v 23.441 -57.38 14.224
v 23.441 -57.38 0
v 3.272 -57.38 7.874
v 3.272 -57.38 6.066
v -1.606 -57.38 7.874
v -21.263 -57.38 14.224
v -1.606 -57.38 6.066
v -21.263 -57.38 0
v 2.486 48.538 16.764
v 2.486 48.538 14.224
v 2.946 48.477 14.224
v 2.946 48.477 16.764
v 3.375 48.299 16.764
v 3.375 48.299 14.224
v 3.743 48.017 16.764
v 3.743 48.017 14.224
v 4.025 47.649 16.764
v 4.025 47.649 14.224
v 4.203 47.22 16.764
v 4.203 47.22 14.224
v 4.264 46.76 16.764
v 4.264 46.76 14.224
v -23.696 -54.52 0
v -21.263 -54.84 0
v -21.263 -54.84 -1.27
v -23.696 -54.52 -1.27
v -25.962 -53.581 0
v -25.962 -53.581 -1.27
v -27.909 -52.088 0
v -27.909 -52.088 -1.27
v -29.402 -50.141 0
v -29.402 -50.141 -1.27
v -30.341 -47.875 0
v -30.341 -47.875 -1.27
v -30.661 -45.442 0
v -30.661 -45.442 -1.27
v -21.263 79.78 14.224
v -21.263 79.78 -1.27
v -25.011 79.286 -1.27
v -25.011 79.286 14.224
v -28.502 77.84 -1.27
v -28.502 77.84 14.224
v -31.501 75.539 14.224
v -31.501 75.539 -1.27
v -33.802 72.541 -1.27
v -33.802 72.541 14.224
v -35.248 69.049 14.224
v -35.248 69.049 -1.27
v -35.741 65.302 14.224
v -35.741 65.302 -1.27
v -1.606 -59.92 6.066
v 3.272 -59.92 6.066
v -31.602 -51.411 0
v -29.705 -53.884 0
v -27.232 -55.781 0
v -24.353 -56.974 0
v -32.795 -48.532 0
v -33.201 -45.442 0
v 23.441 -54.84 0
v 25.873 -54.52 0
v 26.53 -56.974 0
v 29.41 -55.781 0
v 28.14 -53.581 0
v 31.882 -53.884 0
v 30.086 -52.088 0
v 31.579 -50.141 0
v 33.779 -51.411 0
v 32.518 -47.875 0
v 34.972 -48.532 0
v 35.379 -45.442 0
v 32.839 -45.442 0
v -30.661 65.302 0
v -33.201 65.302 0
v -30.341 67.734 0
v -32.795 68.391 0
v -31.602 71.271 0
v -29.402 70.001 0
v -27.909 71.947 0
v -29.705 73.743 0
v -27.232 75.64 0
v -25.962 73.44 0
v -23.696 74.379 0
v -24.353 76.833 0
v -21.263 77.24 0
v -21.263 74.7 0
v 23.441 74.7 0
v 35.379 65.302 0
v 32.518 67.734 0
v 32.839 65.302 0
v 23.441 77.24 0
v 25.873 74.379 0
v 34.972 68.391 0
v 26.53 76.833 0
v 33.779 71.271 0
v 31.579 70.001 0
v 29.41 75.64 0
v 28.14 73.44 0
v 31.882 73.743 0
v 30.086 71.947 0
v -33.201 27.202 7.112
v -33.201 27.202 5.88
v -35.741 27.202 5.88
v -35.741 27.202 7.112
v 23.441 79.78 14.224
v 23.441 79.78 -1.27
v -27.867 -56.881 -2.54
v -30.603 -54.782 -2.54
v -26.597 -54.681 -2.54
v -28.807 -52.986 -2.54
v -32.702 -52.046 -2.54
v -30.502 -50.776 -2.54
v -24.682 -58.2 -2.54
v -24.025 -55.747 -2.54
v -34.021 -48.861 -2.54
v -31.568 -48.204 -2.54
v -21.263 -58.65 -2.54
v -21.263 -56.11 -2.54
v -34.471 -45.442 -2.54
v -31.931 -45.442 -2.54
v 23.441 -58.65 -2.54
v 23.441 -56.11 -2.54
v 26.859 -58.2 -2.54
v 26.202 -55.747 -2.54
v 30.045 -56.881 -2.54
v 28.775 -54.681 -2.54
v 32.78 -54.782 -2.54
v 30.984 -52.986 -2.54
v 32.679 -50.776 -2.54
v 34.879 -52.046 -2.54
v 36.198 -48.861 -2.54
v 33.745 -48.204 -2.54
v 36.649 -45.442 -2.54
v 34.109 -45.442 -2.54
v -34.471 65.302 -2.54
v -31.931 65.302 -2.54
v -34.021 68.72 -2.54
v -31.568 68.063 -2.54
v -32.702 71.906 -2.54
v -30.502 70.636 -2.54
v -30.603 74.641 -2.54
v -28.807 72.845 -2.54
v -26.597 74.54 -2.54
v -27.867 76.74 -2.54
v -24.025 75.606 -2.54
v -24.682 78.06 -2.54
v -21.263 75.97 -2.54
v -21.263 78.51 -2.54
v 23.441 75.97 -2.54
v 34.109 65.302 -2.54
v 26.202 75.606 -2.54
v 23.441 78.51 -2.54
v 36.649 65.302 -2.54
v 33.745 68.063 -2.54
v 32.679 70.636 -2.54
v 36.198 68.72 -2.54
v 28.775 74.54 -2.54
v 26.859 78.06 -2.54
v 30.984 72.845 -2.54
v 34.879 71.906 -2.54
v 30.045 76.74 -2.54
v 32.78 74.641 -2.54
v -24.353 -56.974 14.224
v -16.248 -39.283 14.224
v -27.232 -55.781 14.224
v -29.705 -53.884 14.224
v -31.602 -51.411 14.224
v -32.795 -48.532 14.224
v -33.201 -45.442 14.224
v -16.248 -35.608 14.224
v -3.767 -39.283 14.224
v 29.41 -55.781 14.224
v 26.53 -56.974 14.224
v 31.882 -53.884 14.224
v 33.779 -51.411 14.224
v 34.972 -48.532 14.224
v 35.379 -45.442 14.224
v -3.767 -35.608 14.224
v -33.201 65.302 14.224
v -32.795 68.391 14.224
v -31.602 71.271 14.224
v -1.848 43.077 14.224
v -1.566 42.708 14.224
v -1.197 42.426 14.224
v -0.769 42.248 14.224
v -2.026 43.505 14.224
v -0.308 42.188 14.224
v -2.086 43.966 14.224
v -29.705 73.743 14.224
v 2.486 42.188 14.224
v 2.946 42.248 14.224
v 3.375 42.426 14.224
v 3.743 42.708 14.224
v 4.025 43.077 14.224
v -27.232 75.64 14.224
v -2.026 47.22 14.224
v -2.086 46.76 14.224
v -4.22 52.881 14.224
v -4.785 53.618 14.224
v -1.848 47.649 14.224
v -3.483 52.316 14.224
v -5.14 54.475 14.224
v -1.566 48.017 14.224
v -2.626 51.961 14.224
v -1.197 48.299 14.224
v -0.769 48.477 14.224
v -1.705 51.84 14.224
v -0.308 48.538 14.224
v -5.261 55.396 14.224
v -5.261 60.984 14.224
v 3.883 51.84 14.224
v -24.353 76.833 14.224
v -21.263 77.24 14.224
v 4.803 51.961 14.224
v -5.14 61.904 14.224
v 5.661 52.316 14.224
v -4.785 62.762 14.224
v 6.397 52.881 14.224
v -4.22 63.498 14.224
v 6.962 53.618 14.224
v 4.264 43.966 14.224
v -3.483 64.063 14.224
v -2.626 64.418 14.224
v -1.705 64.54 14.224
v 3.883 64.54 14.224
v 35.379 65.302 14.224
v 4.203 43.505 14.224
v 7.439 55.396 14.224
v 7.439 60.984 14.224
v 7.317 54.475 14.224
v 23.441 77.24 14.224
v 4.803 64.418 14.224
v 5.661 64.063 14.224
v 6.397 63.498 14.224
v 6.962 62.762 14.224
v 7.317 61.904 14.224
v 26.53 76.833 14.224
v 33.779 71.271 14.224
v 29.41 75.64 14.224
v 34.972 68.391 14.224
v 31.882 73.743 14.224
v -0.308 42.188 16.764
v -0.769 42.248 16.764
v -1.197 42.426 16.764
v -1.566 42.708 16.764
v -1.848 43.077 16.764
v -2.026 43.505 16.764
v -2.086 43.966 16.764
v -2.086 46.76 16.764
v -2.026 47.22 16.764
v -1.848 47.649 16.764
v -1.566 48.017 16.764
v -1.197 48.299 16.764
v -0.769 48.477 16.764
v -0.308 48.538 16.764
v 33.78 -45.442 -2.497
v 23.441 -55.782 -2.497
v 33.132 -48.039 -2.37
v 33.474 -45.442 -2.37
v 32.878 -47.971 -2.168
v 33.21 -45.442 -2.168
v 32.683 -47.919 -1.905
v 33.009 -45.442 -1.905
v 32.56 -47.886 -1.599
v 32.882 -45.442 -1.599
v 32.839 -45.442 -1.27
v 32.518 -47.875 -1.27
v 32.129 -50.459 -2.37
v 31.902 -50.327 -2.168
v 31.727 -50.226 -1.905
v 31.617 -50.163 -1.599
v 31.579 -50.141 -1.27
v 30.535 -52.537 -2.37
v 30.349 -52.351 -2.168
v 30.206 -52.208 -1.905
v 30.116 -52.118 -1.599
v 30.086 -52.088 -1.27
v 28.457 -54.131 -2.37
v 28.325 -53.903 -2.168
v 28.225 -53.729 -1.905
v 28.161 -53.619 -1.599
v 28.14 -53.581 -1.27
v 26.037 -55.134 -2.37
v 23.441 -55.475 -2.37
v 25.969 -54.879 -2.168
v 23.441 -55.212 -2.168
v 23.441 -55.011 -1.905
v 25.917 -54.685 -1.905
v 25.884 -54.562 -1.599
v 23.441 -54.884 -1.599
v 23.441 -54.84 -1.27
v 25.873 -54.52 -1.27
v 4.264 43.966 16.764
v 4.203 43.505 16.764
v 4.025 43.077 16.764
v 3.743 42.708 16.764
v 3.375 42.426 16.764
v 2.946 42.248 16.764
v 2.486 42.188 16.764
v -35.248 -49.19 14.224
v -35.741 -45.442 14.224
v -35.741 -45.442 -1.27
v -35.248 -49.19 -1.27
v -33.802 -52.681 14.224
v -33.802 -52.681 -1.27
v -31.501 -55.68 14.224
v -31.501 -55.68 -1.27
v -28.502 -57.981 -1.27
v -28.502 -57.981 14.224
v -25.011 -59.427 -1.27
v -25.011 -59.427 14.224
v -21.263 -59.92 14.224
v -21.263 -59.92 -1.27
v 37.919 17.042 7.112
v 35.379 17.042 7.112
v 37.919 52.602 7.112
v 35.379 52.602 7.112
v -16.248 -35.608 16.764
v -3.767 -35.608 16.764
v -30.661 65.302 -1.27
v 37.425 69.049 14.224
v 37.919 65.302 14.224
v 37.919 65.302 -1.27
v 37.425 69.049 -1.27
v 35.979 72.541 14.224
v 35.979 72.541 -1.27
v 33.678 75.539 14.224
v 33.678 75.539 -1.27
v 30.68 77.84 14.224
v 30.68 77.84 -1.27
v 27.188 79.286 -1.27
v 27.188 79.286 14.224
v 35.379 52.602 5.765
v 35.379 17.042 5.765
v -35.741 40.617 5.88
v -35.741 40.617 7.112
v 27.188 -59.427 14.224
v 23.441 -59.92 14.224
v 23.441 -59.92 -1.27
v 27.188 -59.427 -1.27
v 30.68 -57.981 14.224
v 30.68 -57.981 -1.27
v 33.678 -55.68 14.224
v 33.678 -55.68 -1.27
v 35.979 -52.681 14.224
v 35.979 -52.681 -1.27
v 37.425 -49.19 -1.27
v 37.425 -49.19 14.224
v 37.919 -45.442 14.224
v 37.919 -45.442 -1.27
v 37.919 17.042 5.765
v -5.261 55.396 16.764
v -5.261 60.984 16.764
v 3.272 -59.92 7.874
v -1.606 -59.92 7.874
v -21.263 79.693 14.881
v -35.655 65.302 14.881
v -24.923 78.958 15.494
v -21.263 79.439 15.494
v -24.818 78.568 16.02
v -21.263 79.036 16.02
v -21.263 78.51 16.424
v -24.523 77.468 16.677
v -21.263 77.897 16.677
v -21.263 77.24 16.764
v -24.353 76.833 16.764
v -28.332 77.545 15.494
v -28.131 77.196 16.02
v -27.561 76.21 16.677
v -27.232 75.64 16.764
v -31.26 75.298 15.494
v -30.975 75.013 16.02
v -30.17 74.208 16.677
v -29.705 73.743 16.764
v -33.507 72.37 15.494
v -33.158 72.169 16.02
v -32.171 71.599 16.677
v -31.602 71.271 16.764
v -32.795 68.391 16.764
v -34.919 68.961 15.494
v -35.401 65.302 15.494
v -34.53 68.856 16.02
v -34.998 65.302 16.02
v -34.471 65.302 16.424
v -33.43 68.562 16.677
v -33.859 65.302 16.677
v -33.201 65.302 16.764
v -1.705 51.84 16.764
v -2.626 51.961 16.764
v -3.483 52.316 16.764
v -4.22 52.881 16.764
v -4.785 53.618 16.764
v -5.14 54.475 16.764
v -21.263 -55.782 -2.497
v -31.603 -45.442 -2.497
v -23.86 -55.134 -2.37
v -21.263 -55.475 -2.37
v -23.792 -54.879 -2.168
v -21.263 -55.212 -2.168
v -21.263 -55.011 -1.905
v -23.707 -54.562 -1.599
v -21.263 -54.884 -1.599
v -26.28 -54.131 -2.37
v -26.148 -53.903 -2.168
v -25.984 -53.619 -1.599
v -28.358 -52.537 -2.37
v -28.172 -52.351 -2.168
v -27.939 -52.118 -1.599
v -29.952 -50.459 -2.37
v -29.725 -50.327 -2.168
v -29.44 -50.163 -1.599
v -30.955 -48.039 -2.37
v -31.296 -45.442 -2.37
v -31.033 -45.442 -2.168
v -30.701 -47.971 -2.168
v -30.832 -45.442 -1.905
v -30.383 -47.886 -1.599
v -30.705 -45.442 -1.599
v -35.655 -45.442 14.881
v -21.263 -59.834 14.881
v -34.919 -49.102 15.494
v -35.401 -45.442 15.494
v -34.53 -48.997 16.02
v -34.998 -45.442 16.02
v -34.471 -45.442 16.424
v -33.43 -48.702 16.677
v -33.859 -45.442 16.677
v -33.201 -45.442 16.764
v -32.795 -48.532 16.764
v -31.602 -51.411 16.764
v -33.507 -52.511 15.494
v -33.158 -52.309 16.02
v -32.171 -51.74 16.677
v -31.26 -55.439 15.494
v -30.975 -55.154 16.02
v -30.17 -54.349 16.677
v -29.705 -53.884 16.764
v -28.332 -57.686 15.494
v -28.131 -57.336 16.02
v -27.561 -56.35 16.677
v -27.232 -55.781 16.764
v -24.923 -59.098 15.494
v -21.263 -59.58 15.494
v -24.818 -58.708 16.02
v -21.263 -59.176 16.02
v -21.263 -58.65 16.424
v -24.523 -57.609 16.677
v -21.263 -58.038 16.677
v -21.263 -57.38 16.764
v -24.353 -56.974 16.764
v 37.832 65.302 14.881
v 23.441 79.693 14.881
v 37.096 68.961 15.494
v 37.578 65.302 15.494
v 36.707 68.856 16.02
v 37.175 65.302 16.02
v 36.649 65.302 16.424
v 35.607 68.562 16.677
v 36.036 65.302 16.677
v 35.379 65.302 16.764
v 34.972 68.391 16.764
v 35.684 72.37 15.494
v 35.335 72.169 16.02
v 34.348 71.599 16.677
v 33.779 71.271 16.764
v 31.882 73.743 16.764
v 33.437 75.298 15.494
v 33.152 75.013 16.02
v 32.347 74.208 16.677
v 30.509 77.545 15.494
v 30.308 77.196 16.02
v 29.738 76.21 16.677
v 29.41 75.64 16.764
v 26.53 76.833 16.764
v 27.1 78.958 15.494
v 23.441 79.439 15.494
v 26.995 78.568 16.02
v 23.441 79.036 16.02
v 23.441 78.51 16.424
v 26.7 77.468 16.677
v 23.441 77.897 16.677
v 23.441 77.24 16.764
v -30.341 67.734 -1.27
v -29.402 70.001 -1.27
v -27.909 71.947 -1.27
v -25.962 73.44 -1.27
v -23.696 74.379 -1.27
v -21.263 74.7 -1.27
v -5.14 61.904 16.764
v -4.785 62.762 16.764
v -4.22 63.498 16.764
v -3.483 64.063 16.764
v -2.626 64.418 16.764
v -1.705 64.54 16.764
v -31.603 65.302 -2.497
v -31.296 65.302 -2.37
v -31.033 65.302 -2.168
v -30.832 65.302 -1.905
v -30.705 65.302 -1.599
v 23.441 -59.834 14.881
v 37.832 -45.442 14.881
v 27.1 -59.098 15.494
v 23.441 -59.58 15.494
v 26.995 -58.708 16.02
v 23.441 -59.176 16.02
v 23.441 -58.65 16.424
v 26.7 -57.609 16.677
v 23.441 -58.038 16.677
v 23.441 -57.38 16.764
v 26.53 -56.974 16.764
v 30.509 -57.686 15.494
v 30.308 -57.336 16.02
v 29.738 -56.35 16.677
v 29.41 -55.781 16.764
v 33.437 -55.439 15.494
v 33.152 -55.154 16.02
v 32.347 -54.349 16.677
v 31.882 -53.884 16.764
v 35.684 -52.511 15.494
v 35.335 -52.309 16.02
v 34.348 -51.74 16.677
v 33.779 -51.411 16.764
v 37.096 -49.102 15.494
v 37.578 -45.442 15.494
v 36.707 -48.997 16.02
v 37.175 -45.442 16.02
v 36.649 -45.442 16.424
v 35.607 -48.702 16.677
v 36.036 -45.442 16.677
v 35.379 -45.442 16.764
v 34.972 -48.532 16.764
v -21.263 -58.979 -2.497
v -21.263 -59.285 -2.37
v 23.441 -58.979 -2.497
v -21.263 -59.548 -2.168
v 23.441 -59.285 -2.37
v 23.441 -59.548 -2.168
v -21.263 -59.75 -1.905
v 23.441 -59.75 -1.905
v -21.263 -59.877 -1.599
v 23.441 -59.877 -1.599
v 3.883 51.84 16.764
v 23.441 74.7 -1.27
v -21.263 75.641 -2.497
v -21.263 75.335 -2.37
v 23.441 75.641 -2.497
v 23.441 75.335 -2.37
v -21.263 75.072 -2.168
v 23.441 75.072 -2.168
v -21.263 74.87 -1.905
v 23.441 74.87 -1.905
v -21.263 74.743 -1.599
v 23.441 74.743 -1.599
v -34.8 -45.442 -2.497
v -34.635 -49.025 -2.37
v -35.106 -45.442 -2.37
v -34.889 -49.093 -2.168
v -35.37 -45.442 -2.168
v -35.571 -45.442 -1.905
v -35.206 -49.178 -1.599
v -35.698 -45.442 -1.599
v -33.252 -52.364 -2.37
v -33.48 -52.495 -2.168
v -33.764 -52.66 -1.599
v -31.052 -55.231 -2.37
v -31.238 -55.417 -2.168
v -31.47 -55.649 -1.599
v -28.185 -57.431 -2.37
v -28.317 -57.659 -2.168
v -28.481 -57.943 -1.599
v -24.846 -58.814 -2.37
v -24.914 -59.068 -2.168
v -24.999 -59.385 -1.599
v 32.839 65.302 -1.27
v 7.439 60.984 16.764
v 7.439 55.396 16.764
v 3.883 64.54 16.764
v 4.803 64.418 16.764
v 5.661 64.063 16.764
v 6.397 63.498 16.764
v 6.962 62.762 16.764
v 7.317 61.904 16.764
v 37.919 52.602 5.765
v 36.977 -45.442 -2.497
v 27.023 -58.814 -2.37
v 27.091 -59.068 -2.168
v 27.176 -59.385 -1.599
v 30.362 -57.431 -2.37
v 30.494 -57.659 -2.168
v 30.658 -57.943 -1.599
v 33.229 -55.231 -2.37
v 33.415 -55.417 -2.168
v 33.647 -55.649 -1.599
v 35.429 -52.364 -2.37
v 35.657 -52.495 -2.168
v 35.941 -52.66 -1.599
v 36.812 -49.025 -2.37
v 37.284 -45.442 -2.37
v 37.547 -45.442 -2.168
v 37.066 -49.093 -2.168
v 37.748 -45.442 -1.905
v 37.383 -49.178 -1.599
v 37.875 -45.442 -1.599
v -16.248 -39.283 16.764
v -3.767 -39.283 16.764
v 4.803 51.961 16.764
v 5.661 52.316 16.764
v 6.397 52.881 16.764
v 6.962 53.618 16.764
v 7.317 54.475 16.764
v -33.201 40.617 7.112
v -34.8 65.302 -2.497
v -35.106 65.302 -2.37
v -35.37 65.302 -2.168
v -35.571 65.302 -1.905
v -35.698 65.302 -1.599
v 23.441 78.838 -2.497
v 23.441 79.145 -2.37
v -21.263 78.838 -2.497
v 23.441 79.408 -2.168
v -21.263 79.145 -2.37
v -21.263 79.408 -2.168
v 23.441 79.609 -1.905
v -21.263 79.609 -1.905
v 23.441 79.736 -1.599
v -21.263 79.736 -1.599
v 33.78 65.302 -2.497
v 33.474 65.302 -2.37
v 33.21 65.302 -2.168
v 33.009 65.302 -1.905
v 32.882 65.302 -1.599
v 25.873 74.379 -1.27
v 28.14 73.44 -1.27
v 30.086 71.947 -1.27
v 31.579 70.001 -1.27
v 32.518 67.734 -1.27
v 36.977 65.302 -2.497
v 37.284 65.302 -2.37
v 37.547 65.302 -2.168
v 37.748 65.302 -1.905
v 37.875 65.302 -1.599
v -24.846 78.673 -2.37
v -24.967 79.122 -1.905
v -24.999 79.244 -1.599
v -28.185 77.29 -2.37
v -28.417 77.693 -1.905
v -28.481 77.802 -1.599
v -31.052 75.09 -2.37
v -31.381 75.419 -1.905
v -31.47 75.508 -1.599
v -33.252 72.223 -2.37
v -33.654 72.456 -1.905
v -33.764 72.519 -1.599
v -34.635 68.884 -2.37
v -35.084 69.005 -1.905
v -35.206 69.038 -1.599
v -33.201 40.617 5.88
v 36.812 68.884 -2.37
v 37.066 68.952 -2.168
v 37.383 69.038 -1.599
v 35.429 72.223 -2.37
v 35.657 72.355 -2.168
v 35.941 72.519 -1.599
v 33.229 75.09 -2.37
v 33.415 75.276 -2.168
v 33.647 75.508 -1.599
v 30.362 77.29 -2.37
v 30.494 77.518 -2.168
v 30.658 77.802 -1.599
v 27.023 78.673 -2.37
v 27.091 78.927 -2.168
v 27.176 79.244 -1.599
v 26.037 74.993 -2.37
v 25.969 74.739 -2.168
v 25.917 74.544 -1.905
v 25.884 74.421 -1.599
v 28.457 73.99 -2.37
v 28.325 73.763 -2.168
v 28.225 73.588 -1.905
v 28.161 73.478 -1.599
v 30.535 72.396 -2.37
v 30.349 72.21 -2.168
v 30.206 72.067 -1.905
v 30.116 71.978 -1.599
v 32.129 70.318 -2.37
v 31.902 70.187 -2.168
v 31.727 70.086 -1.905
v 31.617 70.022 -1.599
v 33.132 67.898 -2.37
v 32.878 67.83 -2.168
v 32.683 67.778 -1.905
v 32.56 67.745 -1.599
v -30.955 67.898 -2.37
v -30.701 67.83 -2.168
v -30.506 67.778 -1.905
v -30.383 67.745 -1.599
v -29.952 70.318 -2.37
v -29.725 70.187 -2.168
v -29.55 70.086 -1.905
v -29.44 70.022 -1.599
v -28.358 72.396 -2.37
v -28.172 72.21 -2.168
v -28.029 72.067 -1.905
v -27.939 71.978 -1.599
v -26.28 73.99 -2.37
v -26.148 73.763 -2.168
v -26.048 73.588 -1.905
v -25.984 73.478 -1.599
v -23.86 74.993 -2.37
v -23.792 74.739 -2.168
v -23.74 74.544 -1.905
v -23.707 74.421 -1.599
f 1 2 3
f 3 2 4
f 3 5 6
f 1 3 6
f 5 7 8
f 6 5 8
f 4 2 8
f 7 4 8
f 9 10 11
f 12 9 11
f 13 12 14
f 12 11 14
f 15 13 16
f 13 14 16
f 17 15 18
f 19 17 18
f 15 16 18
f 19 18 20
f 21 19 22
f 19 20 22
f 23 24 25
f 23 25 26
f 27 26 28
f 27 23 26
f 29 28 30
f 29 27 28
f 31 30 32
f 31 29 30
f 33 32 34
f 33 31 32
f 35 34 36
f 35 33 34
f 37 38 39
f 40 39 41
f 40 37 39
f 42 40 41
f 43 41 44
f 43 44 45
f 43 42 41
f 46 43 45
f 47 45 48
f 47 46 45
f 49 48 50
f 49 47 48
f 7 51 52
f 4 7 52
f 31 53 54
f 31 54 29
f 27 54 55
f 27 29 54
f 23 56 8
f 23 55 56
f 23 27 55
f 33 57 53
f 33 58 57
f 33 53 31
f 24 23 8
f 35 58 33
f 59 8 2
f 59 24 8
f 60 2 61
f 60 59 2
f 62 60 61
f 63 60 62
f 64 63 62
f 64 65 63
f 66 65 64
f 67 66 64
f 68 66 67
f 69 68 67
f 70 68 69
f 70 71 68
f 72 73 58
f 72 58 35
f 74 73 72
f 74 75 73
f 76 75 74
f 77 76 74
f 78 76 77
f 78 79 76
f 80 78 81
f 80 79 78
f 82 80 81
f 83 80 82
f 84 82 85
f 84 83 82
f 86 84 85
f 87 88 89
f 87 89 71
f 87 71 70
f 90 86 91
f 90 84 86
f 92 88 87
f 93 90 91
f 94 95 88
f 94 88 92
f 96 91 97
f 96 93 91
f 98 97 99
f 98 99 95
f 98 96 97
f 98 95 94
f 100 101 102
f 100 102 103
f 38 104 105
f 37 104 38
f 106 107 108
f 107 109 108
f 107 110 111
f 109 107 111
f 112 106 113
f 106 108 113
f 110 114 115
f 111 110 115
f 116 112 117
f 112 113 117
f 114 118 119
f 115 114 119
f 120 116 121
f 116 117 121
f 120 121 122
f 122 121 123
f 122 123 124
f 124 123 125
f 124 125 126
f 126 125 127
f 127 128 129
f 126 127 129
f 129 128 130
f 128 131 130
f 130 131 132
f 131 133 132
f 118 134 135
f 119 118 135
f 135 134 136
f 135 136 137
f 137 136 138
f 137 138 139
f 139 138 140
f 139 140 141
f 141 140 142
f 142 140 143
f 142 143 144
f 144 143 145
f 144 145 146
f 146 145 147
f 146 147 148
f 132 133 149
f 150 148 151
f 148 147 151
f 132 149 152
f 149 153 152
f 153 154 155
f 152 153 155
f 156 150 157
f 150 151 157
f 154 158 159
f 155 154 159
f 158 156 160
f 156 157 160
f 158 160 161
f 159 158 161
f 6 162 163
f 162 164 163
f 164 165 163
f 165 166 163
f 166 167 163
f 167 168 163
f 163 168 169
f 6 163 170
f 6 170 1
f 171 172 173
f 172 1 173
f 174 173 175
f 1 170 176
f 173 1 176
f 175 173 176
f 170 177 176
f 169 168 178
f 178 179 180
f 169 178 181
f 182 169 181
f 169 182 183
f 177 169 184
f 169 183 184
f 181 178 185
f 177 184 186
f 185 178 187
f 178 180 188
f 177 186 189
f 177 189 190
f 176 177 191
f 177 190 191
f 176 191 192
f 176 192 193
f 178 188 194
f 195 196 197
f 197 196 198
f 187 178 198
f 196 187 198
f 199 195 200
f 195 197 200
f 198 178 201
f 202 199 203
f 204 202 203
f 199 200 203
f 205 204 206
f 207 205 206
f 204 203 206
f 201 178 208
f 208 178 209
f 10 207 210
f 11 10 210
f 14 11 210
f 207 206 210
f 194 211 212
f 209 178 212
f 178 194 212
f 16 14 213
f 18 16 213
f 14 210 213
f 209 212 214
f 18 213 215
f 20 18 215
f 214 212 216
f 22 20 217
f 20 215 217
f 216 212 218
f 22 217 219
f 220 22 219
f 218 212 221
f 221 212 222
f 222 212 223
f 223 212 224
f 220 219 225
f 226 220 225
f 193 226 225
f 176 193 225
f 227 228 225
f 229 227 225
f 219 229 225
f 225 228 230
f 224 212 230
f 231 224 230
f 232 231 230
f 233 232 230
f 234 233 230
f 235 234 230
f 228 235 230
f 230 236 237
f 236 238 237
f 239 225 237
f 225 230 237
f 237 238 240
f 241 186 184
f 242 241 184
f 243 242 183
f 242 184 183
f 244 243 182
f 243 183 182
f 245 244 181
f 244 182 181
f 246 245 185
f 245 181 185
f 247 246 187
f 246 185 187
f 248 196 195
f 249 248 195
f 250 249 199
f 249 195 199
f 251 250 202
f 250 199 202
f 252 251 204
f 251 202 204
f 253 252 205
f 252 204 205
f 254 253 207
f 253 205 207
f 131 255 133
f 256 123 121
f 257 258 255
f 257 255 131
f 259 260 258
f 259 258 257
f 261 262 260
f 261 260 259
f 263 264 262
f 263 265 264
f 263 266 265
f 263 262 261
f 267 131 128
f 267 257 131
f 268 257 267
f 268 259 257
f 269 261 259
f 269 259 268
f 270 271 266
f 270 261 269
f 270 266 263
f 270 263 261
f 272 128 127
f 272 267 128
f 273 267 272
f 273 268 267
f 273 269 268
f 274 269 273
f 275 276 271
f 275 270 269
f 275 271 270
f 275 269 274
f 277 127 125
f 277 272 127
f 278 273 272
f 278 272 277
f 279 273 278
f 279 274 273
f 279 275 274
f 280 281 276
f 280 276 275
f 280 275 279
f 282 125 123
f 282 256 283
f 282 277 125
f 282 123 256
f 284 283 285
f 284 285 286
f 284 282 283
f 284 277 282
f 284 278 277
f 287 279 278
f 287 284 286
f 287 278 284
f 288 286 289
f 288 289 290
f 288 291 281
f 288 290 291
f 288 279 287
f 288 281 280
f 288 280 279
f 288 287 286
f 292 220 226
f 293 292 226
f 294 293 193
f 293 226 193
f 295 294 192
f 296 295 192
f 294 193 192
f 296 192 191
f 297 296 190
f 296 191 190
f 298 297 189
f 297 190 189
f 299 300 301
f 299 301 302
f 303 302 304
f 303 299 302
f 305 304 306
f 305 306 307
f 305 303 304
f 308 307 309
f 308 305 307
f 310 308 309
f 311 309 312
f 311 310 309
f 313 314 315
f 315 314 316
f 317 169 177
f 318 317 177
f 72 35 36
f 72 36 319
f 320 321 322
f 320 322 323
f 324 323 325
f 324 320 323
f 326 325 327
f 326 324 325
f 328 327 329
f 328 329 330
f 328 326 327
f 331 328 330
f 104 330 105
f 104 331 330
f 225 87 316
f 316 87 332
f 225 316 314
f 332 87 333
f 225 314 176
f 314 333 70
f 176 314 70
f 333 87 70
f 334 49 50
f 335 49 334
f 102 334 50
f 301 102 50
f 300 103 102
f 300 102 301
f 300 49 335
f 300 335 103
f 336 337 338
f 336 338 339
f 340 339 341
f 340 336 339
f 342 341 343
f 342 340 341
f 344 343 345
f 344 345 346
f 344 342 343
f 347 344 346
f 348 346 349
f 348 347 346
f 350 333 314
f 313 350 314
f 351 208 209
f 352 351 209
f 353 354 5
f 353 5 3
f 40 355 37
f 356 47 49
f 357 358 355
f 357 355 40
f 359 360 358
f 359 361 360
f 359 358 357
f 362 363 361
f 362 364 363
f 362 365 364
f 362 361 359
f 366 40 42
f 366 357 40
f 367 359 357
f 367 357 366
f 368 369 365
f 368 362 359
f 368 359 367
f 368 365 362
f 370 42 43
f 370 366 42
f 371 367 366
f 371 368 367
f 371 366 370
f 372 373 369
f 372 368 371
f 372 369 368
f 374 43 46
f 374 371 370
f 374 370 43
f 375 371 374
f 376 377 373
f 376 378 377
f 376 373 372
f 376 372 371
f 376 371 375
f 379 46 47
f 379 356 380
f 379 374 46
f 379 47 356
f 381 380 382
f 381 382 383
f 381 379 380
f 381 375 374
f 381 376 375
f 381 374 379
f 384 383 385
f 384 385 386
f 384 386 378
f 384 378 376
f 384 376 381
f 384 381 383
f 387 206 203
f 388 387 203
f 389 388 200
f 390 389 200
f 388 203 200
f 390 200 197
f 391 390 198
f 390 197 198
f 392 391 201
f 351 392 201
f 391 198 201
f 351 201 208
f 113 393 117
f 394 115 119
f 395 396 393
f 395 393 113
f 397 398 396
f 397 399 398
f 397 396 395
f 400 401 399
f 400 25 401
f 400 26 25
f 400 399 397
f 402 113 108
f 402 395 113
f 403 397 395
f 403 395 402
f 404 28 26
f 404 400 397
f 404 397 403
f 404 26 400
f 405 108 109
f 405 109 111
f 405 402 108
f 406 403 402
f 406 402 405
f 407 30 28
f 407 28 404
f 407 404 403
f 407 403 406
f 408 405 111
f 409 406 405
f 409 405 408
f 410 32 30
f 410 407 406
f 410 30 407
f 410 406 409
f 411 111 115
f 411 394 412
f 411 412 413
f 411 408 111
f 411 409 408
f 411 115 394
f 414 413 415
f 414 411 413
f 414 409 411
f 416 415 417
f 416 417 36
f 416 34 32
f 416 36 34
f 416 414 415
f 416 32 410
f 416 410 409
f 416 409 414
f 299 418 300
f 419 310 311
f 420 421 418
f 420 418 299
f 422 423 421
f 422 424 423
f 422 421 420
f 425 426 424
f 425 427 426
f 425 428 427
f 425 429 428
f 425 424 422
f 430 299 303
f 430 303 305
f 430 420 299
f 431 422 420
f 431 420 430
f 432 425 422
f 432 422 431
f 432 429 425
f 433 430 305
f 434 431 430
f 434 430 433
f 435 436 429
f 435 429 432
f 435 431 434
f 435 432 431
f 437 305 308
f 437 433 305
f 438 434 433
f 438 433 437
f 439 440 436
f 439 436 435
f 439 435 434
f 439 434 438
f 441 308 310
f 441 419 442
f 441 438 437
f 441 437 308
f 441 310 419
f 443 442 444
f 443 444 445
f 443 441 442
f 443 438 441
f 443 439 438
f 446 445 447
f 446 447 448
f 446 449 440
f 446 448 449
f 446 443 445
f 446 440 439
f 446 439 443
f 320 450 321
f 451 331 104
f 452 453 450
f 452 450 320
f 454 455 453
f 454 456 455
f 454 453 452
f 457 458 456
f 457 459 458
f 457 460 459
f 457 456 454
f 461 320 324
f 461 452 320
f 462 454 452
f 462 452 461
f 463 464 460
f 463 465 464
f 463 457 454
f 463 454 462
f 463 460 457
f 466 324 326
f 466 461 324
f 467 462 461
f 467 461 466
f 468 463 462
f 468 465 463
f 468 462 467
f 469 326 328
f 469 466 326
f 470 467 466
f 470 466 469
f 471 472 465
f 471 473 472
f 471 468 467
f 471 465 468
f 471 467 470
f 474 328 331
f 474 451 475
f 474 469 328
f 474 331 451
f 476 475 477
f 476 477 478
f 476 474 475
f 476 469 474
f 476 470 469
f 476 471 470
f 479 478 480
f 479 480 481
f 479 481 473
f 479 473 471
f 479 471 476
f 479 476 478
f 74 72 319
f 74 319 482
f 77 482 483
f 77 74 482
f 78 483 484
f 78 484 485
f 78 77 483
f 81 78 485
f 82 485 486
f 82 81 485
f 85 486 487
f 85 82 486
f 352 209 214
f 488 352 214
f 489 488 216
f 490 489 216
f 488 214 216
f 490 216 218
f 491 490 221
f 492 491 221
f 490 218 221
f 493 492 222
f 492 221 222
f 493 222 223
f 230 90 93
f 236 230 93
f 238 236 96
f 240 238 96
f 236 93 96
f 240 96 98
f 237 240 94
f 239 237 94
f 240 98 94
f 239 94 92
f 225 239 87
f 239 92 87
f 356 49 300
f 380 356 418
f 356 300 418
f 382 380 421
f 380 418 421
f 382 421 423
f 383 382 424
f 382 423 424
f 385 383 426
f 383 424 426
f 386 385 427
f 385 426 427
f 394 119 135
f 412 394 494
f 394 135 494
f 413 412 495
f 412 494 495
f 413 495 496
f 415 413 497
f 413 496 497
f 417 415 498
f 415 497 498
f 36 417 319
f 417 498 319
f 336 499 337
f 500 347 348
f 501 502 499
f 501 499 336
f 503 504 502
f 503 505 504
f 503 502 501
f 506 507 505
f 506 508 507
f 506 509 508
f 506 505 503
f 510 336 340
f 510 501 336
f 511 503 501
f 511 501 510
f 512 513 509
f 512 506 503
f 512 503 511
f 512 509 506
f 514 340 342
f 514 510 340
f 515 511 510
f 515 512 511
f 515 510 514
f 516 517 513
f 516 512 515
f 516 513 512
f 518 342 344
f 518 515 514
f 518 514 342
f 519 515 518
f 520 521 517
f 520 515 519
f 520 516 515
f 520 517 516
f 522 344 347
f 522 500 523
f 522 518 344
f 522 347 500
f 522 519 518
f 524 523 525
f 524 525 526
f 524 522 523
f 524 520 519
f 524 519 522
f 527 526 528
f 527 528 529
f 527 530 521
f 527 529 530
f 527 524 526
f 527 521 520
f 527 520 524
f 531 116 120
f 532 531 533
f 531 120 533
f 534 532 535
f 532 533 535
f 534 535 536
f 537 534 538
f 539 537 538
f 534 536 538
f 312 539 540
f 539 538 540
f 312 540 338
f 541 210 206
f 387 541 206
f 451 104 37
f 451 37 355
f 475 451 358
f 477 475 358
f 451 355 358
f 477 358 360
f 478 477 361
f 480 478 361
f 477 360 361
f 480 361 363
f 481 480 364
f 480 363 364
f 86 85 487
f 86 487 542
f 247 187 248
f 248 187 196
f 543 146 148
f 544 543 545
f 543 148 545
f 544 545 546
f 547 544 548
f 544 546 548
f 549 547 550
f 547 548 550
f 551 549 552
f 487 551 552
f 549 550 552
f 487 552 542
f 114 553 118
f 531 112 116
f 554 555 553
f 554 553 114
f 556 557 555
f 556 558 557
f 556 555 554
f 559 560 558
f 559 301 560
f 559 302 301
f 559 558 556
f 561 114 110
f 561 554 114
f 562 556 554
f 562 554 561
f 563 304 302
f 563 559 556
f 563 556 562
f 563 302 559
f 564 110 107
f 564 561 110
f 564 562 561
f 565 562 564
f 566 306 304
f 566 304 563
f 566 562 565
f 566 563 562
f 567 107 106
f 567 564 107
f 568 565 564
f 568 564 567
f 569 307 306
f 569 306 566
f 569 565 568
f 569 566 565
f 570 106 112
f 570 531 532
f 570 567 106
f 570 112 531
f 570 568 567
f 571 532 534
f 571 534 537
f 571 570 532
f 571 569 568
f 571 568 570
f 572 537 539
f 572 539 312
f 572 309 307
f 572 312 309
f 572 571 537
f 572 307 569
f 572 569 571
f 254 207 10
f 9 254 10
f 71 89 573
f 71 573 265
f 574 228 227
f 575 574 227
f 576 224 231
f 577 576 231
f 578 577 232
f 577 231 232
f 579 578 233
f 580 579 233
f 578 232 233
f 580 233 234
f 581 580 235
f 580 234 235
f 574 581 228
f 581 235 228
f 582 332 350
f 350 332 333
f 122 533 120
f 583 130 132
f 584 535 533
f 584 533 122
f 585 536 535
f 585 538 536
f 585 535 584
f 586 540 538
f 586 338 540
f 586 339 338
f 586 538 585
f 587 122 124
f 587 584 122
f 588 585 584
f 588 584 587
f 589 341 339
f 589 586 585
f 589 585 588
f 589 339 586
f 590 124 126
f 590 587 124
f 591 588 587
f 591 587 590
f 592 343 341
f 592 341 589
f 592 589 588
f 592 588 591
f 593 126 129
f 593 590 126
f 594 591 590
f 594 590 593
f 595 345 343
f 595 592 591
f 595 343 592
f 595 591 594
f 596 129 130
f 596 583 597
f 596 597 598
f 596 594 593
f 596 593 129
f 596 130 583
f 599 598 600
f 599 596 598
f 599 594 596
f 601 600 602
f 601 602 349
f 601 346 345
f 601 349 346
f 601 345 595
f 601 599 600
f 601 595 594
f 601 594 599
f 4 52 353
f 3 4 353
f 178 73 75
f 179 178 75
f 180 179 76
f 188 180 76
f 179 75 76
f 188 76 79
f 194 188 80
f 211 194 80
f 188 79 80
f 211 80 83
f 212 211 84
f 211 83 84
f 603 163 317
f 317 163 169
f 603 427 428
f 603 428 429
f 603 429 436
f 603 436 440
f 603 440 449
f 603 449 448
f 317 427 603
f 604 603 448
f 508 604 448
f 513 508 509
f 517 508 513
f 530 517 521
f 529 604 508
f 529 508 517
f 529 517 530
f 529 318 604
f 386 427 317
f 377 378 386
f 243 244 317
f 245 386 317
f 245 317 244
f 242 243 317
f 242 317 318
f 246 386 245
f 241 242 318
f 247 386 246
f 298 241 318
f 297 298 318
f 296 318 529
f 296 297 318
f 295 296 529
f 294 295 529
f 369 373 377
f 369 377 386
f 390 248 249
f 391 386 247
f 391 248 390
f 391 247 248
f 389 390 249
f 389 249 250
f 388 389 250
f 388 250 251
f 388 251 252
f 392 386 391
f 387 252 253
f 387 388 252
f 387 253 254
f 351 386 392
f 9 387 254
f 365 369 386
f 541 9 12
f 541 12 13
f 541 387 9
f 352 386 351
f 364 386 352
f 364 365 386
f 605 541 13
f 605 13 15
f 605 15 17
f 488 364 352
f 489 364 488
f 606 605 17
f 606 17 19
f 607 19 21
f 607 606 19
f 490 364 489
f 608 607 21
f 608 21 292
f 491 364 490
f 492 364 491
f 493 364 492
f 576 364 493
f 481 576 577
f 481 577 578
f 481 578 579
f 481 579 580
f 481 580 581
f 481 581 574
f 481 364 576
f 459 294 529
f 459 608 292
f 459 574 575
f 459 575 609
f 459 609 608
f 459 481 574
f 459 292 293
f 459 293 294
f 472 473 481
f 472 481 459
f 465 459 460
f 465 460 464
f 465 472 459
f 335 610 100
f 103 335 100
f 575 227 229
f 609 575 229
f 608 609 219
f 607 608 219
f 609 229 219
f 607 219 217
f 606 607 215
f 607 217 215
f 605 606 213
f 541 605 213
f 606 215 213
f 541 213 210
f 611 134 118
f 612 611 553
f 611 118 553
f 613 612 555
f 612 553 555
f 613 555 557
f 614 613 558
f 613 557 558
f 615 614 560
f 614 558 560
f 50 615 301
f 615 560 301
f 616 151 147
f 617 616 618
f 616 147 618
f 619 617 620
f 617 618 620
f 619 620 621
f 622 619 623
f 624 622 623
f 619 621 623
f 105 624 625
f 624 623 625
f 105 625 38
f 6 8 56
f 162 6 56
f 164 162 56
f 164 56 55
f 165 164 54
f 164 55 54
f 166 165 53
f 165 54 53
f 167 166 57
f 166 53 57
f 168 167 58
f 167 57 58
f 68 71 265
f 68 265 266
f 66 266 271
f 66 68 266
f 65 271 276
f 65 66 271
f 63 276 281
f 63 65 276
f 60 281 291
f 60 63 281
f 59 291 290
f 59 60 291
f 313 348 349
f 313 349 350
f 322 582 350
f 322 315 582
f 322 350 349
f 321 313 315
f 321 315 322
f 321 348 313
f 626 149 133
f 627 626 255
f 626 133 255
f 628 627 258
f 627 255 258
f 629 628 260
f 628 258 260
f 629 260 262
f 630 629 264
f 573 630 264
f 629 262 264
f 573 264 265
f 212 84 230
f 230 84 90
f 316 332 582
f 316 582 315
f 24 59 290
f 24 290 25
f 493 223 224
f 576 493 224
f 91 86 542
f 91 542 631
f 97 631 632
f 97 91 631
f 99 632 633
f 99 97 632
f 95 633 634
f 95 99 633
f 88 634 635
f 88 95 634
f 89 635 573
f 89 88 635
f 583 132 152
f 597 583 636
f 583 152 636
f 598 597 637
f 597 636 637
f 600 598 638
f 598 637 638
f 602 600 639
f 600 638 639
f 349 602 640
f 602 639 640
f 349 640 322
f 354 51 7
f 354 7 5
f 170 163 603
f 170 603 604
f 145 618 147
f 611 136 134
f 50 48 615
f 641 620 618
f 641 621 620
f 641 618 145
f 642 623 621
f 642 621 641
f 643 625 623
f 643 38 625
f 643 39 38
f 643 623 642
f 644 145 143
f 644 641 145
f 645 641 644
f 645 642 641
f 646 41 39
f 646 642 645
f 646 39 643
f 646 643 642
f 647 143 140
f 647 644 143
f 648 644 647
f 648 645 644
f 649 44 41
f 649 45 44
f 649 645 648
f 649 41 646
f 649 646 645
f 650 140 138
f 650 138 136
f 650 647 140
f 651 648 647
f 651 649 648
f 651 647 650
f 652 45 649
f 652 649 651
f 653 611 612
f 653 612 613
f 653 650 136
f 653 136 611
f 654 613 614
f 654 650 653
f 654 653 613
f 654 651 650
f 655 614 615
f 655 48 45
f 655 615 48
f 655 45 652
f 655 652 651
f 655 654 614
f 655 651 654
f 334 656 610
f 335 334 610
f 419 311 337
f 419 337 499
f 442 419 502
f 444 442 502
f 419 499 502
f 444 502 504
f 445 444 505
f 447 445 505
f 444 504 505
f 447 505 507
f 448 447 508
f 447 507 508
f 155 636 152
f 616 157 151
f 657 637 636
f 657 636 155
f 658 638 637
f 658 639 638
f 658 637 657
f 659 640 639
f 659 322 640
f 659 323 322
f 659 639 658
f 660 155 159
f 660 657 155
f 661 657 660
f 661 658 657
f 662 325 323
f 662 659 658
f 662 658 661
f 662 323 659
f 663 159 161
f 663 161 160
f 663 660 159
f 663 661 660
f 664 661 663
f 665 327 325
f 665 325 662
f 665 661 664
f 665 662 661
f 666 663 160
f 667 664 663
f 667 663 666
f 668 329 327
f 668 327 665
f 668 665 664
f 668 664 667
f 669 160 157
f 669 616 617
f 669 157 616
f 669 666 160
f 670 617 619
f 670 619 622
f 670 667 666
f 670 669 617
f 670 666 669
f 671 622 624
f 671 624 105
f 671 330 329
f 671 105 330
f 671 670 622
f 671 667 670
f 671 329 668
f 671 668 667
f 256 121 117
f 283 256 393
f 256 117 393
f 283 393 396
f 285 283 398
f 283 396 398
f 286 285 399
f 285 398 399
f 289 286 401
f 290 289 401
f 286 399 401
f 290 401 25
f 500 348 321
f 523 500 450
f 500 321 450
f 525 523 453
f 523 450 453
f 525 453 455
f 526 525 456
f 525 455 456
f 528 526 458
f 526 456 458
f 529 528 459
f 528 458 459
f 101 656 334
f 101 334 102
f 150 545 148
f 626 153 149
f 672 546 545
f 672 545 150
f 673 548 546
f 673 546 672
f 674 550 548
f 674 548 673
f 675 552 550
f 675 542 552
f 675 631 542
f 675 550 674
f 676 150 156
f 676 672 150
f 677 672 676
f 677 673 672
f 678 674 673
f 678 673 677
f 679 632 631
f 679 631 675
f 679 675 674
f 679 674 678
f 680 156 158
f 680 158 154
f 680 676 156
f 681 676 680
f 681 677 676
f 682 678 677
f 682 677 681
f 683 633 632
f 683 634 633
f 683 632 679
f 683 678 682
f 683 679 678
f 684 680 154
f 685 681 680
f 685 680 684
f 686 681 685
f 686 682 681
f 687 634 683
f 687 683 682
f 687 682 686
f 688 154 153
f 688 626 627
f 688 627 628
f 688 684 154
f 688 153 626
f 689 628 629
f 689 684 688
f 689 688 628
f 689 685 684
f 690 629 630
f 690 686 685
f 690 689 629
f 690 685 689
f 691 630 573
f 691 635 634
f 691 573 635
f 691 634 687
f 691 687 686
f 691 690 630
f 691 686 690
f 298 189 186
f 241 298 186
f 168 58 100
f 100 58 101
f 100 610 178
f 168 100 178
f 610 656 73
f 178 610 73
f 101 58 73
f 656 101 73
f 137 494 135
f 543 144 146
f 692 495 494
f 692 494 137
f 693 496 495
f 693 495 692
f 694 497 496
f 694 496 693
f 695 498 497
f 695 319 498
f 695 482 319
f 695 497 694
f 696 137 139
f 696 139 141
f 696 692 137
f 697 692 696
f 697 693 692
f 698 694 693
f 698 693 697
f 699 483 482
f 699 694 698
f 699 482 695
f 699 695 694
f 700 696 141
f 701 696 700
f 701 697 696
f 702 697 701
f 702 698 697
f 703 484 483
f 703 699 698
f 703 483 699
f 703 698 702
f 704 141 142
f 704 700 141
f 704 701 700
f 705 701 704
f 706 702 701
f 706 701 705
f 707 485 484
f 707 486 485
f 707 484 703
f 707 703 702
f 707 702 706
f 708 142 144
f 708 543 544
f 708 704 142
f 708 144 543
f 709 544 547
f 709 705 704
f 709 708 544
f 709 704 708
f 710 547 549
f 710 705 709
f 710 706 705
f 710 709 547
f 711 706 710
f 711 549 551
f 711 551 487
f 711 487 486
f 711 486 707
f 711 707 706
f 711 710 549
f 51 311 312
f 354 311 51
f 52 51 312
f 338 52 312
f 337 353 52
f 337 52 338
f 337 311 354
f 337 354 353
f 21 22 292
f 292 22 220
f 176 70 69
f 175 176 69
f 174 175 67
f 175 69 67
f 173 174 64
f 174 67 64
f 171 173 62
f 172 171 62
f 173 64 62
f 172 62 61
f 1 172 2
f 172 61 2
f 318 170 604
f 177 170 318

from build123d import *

# Parameters (mm, degrees)
F1_DEPTH   = 14.224
F2_W       = 16.002
F2_H       = 1.3465428281
F2_W_2     = 9.398
F2_W_3     = 10.16
F3_DEPTH   = 76.2
F4_W       = 13.4153888345
F4_H       = 1.2321065667
F5_DEPTH   = 25.4
F7_DEPTH   = 14.224
F1_FACE2_W = 12.4812044669
F1_FACE2_H = 3.6749392748
F8_DEPTH   = 2.54
F9_DEPTH   = 2.54
F11_R      = 1.27
F6_W       = 4.8780030338
F6_H       = 1.8081708086
F12_DEPTH  = 7.1882
F13_R      = 2.54


with BuildPart() as f1:
    # F0 (on Top) → F1 (new body)
    with BuildSketch(Plane.XY):
        with BuildLine():
            Line((1.0885104024, 77.2395779495), (-21.2634895976, 77.2395779495))
            ThreePointArc((-21.2634895976, 77.2395779495), (-29.7049303514, 73.7430187033), (-33.2014895976, 65.3015779495))
            Line((-33.2014895976, 65.3015779495), (-33.2014895976, -45.4424220505))
            ThreePointArc((-33.2014895976, -45.4424220505), (-29.7049303514, -53.8838628043), (-21.2634895976, -57.3804220505))
            Line((-21.2634895976, -57.3804220505), (1.0885104024, -57.3804220505))
            Line((1.0885104024, -57.3804220505), (1.0885104024, -54.8404220505))
            Line((1.0885104024, -54.8404220505), (-21.2634895976, -54.8404220505))
            ThreePointArc((-21.2634895976, -54.8404220505), (-27.9088791272, -52.0878115801), (-30.6614895976, -45.4424220505))
            Line((-30.6614895976, -45.4424220505), (-30.6614895976, 65.3015779495))
            ThreePointArc((-30.6614895976, 65.3015779495), (-27.9088791272, 71.9469674791), (-21.2634895976, 74.6995779495))
            Line((-21.2634895976, 74.6995779495), (1.0885104024, 74.6995779495))
            Line((1.0885104024, 74.6995779495), (1.0885104024, 77.2395779495))
        make_face()
        with BuildLine():
            Line((23.4405104024, 77.2395779495), (1.0885104024, 77.2395779495))
            Line((1.0885104024, 77.2395779495), (1.0885104024, 74.6995779495))
            Line((1.0885104024, 74.6995779495), (23.4405104024, 74.6995779495))
            ThreePointArc((23.4405104024, 74.6995779495), (30.085899932, 71.9469674791), (32.8385104024, 65.3015779495))
            Line((32.8385104024, 65.3015779495), (32.8385104024, -45.4424220505))
            ThreePointArc((32.8385104024, -45.4424220505), (30.085899932, -52.0878115801), (23.4405104024, -54.8404220505))
            Line((23.4405104024, -54.8404220505), (1.0885104024, -54.8404220505))
            Line((1.0885104024, -54.8404220505), (1.0885104024, -57.3804220505))
            Line((1.0885104024, -57.3804220505), (23.4405104024, -57.3804220505))
            ThreePointArc((23.4405104024, -57.3804220505), (31.8819511562, -53.8838628043), (35.3785104024, -45.4424220505))
            Line((35.3785104024, -45.4424220505), (35.3785104024, 65.3015779495))
            ThreePointArc((35.3785104024, 65.3015779495), (31.8819511562, 73.7430187033), (23.4405104024, 77.2395779495))
        make_face()
        with BuildLine():
            Line((23.4405104024, 74.6995779495), (1.0885104024, 74.6995779495))
            Line((1.0885104024, 74.6995779495), (1.0885104024, 64.5395779495))
            Line((1.0885104024, 64.5395779495), (3.8825104024, 64.5395779495))
            ThreePointArc((3.8825104024, 64.5395779495), (6.3969821163, 63.4980496634), (7.4385104024, 60.9835779495))
            Line((7.4385104024, 60.9835779495), (7.4385104024, 55.3955779495))
            ThreePointArc((7.4385104024, 55.3955779495), (6.3969821163, 52.8811062356), (3.8825104024, 51.8395779495))
            Line((3.8825104024, 51.8395779495), (1.0885104024, 51.8395779495))
            Line((1.0885104024, 51.8395779495), (1.0885104024, 48.5375779495))
            Line((1.0885104024, 48.5375779495), (2.4855104024, 48.5375779495))
            ThreePointArc((2.4855104024, 48.5375779495), (3.7427462594, 48.0168138065), (4.2635104024, 46.7595779495))
            Line((4.2635104024, 46.7595779495), (4.2635104024, 43.9655779495))
            ThreePointArc((4.2635104024, 43.9655779495), (3.7427462594, 42.7083420926), (2.4855104024, 42.1875779495))
            Line((2.4855104024, 42.1875779495), (1.0885104024, 42.1875779495))
            Line((1.0885104024, 42.1875779495), (1.0885104024, -54.8404220505))
            Line((1.0885104024, -54.8404220505), (23.4405104024, -54.8404220505))
            ThreePointArc((23.4405104024, -54.8404220505), (30.085899932, -52.0878115801), (32.8385104024, -45.4424220505))
            Line((32.8385104024, -45.4424220505), (32.8385104024, 65.3015779495))
            ThreePointArc((32.8385104024, 65.3015779495), (30.085899932, 71.9469674791), (23.4405104024, 74.6995779495))
        make_face()
        with BuildLine():
            Line((1.0885104024, 64.5395779495), (1.0885104024, 74.6995779495))
            Line((1.0885104024, 74.6995779495), (-21.2634895976, 74.6995779495))
            ThreePointArc((-21.2634895976, 74.6995779495), (-27.9088791272, 71.9469674791), (-30.6614895976, 65.3015779495))
            Line((-30.6614895976, 65.3015779495), (-30.6614895976, -45.4424220505))
            ThreePointArc((-30.6614895976, -45.4424220505), (-27.9088791272, -52.0878115801), (-21.2634895976, -54.8404220505))
            Line((-21.2634895976, -54.8404220505), (1.0885104024, -54.8404220505))
            Line((1.0885104024, -54.8404220505), (1.0885104024, 42.1875779495))
            Line((1.0885104024, 42.1875779495), (-0.3084895976, 42.1875779495))
            ThreePointArc((-0.3084895976, 42.1875779495), (-1.5657254545, 42.7083420926), (-2.0864895976, 43.9655779495))
            Line((-2.0864895976, 43.9655779495), (-2.0864895976, 46.7595779495))
            ThreePointArc((-2.0864895976, 46.7595779495), (-1.5657254545, 48.0168138065), (-0.3084895976, 48.5375779495))
            Line((-0.3084895976, 48.5375779495), (1.0885104024, 48.5375779495))
            Line((1.0885104024, 48.5375779495), (1.0885104024, 51.8395779495))
            Line((1.0885104024, 51.8395779495), (-1.7054895976, 51.8395779495))
            ThreePointArc((-1.7054895976, 51.8395779495), (-4.2199613115, 52.8811062356), (-5.2614895976, 55.3955779495))
            Line((-5.2614895976, 55.3955779495), (-5.2614895976, 60.9835779495))
            ThreePointArc((-5.2614895976, 60.9835779495), (-4.2199613115, 63.4980496634), (-1.7054895976, 64.5395779495))
            Line((-1.7054895976, 64.5395779495), (1.0885104024, 64.5395779495))
        make_face()
        Polygon((-16.2484161556, -39.2828993499), (-16.2484161556, -37.4030255506), (-16.2484161556, -35.6079600751), (-3.7672116887, -35.6079600751), (-3.7672116887, -39.2828993499), align=None, mode=Mode.SUBTRACT)
    extrude(amount=F1_DEPTH)

    # F2 (on face) → F3 (join)
    with BuildSketch(Plane(origin=(-33.2014895976, 0, 0), x_dir=(0, -1, 0), z_dir=(-1, 0, 0))):
        with Locations((-44.6005779495, 6.438728586)):
            Rectangle(F2_W, F2_H)
        with Locations((-31.9005779495, 6.438728586)):
            Rectangle(F2_W_2, F2_H)
        with Locations((-22.1215779495, 6.438728586)):
            Rectangle(F2_W_3, F2_H)
    extrude(amount=-F3_DEPTH)

    # F4 (on face) → F5 (join)
    with BuildSketch(Plane(origin=(-33.2014895976, 0, 0), x_dir=(0, -1, 0), z_dir=(-1, 0, 0))):
        with Locations((-33.9092723668, 6.4959467167)):
            Rectangle(F4_W, F4_H)
    extrude(amount=F5_DEPTH)


with BuildPart() as f7:
    # F0 (on Top) → F7 (new body)
    with BuildSketch(Plane.XY):
        with BuildLine():
            Line((37.9185104024, -45.4424220505), (37.9185104024, 65.3015779495))
            ThreePointArc((37.9185104024, 65.3015779495), (33.6780023805, 75.5390699275), (23.4405104024, 79.7795779495))
            Line((23.4405104024, 79.7795779495), (-21.2634895976, 79.7795779495))
            ThreePointArc((-21.2634895976, 79.7795779495), (-31.5009815756, 75.5390699275), (-35.7414895976, 65.3015779495))
            Line((-35.7414895976, 65.3015779495), (-35.7414895976, -45.4424220505))
            ThreePointArc((-35.7414895976, -45.4424220505), (-31.5009815756, -55.6799140285), (-21.2634895976, -59.9204220505))
            Line((-21.2634895976, -59.9204220505), (23.4405104024, -59.9204220505))
            ThreePointArc((23.4405104024, -59.9204220505), (33.6780023805, -55.6799140285), (37.9185104024, -45.4424220505))
        make_face()
        with BuildLine():
            ThreePointArc((-33.2014895976, 65.3015779495), (-29.7049303514, 73.7430187033), (-21.2634895976, 77.2395779495))
            Line((-21.2634895976, 77.2395779495), (1.0885104024, 77.2395779495))
            Line((1.0885104024, 77.2395779495), (23.4405104024, 77.2395779495))
            ThreePointArc((23.4405104024, 77.2395779495), (31.8819511562, 73.7430187033), (35.3785104024, 65.3015779495))
            Line((35.3785104024, 65.3015779495), (35.3785104024, -45.4424220505))
            ThreePointArc((35.3785104024, -45.4424220505), (31.8819511562, -53.8838628043), (23.4405104024, -57.3804220505))
            Line((23.4405104024, -57.3804220505), (1.0885104024, -57.3804220505))
            Line((1.0885104024, -57.3804220505), (-21.2634895976, -57.3804220505))
            ThreePointArc((-21.2634895976, -57.3804220505), (-29.7049303514, -53.8838628043), (-33.2014895976, -45.4424220505))
            Line((-33.2014895976, -45.4424220505), (-33.2014895976, 65.3015779495))
        make_face(mode=Mode.SUBTRACT)
    extrude(amount=F7_DEPTH)

    # F7_face (on face) + F1_face2 (on face) → F8 (join)
    with BuildSketch(Plane(origin=(1.0885104024, 9.9295779495, 14.224), x_dir=(1, 0, 0), z_dir=(0, 0, 1))):
        with BuildLine():
            ThreePointArc((22.352, -69.85), (32.589491978, -65.609491978), (36.83, -55.372))
            Line((36.83, -55.372), (36.83, 55.372))
            ThreePointArc((36.83, 55.372), (32.589491978, 65.609491978), (22.352, 69.85))
            Line((22.352, 69.85), (-22.352, 69.85))
            ThreePointArc((-22.352, 69.85), (-32.589491978, 65.609491978), (-36.83, 55.372))
            Line((-36.83, 55.372), (-36.83, -55.372))
            ThreePointArc((-36.83, -55.372), (-32.589491978, -65.609491978), (-22.352, -69.85))
            Line((-22.352, -69.85), (22.352, -69.85))
        make_face()
        with BuildLine():
            ThreePointArc((-34.29, 55.372), (-30.7934407538, 63.8134407538), (-22.352, 67.31))
            Line((-22.352, 67.31), (22.352, 67.31))
            ThreePointArc((22.352, 67.31), (30.7934407538, 63.8134407538), (34.29, 55.372))
            Line((34.29, 55.372), (34.29, -55.372))
            ThreePointArc((34.29, -55.372), (30.7934407538, -63.8134407538), (22.352, -67.31))
            Line((22.352, -67.31), (-22.352, -67.31))
            ThreePointArc((-22.352, -67.31), (-30.7934407538, -63.8134407538), (-34.29, -55.372))
            Line((-34.29, -55.372), (-34.29, 55.372))
        make_face(mode=Mode.SUBTRACT)
    with BuildSketch(Plane(origin=(1.1458518889, 9.2063211199, 14.224), x_dir=(1, 0, 0), z_dir=(0, 0, 1))):
        with BuildLine():
            ThreePointArc((-22.4093414865, 68.0332568296), (-30.8507822403, 64.5366975834), (-34.3473414865, 56.0952568296))
            Line((-34.3473414865, 56.0952568296), (-34.3473414865, -54.6487431704))
            ThreePointArc((-34.3473414865, -54.6487431704), (-30.8507822403, -63.0901839242), (-22.4093414865, -66.5867431704))
            Line((-22.4093414865, -66.5867431704), (22.2946585135, -66.5867431704))
            ThreePointArc((22.2946585135, -66.5867431704), (30.7360992673, -63.0901839242), (34.2326585135, -54.6487431704))
            Line((34.2326585135, -54.6487431704), (34.2326585135, 56.0952568296))
            ThreePointArc((34.2326585135, 56.0952568296), (30.7360992673, 64.5366975834), (22.2946585135, 68.0332568296))
            Line((22.2946585135, 68.0332568296), (-22.4093414865, 68.0332568296))
        make_face()
        with BuildLine():
            ThreePointArc((2.7366585135, 55.3332568296), (5.2511302274, 54.2917285435), (6.2926585135, 51.7772568296))
            Line((6.2926585135, 51.7772568296), (6.2926585135, 46.1892568296))
            ThreePointArc((6.2926585135, 46.1892568296), (5.2511302274, 43.6747851157), (2.7366585135, 42.6332568296))
            Line((2.7366585135, 42.6332568296), (-2.8513414865, 42.6332568296))
            ThreePointArc((-2.8513414865, 42.6332568296), (-5.3658132004, 43.6747851157), (-6.4073414865, 46.1892568296))
            Line((-6.4073414865, 46.1892568296), (-6.4073414865, 51.7772568296))
            ThreePointArc((-6.4073414865, 51.7772568296), (-5.3658132004, 54.2917285435), (-2.8513414865, 55.3332568296))
            Line((-2.8513414865, 55.3332568296), (2.7366585135, 55.3332568296))
        make_face(mode=Mode.SUBTRACT)
        with BuildLine():
            ThreePointArc((1.3396585135, 39.3312568296), (2.5968943705, 38.8104926866), (3.1176585135, 37.5532568296))
            Line((3.1176585135, 37.5532568296), (3.1176585135, 34.7592568296))
            ThreePointArc((3.1176585135, 34.7592568296), (2.5968943705, 33.5020209727), (1.3396585135, 32.9812568296))
            Line((1.3396585135, 32.9812568296), (-1.4543414865, 32.9812568296))
            ThreePointArc((-1.4543414865, 32.9812568296), (-2.7115773434, 33.5020209727), (-3.2323414865, 34.7592568296))
            Line((-3.2323414865, 34.7592568296), (-3.2323414865, 37.5532568296))
            ThreePointArc((-3.2323414865, 37.5532568296), (-2.7115773434, 38.8104926866), (-1.4543414865, 39.3312568296))
            Line((-1.4543414865, 39.3312568296), (1.3396585135, 39.3312568296))
        make_face(mode=Mode.SUBTRACT)
        with Locations((-11.1536658111, -46.6517508324)):
            Rectangle(F1_FACE2_W, F1_FACE2_H, mode=Mode.SUBTRACT)
    extrude(amount=F8_DEPTH)

    # F0 (on Top) → F9 (join)
    with BuildSketch(Plane.XY):
        with BuildLine():
            Line((37.9185104024, -45.4424220505), (37.9185104024, 65.3015779495))
            ThreePointArc((37.9185104024, 65.3015779495), (33.6780023805, 75.5390699275), (23.4405104024, 79.7795779495))
            Line((23.4405104024, 79.7795779495), (-21.2634895976, 79.7795779495))
            ThreePointArc((-21.2634895976, 79.7795779495), (-31.5009815756, 75.5390699275), (-35.7414895976, 65.3015779495))
            Line((-35.7414895976, 65.3015779495), (-35.7414895976, -45.4424220505))
            ThreePointArc((-35.7414895976, -45.4424220505), (-31.5009815756, -55.6799140285), (-21.2634895976, -59.9204220505))
            Line((-21.2634895976, -59.9204220505), (23.4405104024, -59.9204220505))
            ThreePointArc((23.4405104024, -59.9204220505), (33.6780023805, -55.6799140285), (37.9185104024, -45.4424220505))
        make_face()
        with BuildLine():
            ThreePointArc((-33.2014895976, 65.3015779495), (-29.7049303514, 73.7430187033), (-21.2634895976, 77.2395779495))
            Line((-21.2634895976, 77.2395779495), (1.0885104024, 77.2395779495))
            Line((1.0885104024, 77.2395779495), (23.4405104024, 77.2395779495))
            ThreePointArc((23.4405104024, 77.2395779495), (31.8819511562, 73.7430187033), (35.3785104024, 65.3015779495))
            Line((35.3785104024, 65.3015779495), (35.3785104024, -45.4424220505))
            ThreePointArc((35.3785104024, -45.4424220505), (31.8819511562, -53.8838628043), (23.4405104024, -57.3804220505))
            Line((23.4405104024, -57.3804220505), (1.0885104024, -57.3804220505))
            Line((1.0885104024, -57.3804220505), (-21.2634895976, -57.3804220505))
            ThreePointArc((-21.2634895976, -57.3804220505), (-29.7049303514, -53.8838628043), (-33.2014895976, -45.4424220505))
            Line((-33.2014895976, -45.4424220505), (-33.2014895976, 65.3015779495))
        make_face(mode=Mode.SUBTRACT)
        with BuildLine():
            Line((23.4405104024, 77.2395779495), (1.0885104024, 77.2395779495))
            Line((1.0885104024, 77.2395779495), (1.0885104024, 74.6995779495))
            Line((1.0885104024, 74.6995779495), (23.4405104024, 74.6995779495))
            ThreePointArc((23.4405104024, 74.6995779495), (30.085899932, 71.9469674791), (32.8385104024, 65.3015779495))
            Line((32.8385104024, 65.3015779495), (32.8385104024, -45.4424220505))
            ThreePointArc((32.8385104024, -45.4424220505), (30.085899932, -52.0878115801), (23.4405104024, -54.8404220505))
            Line((23.4405104024, -54.8404220505), (1.0885104024, -54.8404220505))
            Line((1.0885104024, -54.8404220505), (1.0885104024, -57.3804220505))
            Line((1.0885104024, -57.3804220505), (23.4405104024, -57.3804220505))
            ThreePointArc((23.4405104024, -57.3804220505), (31.8819511562, -53.8838628043), (35.3785104024, -45.4424220505))
            Line((35.3785104024, -45.4424220505), (35.3785104024, 65.3015779495))
            ThreePointArc((35.3785104024, 65.3015779495), (31.8819511562, 73.7430187033), (23.4405104024, 77.2395779495))
        make_face()
        with BuildLine():
            Line((1.0885104024, 77.2395779495), (-21.2634895976, 77.2395779495))
            ThreePointArc((-21.2634895976, 77.2395779495), (-29.7049303514, 73.7430187033), (-33.2014895976, 65.3015779495))
            Line((-33.2014895976, 65.3015779495), (-33.2014895976, -45.4424220505))
            ThreePointArc((-33.2014895976, -45.4424220505), (-29.7049303514, -53.8838628043), (-21.2634895976, -57.3804220505))
            Line((-21.2634895976, -57.3804220505), (1.0885104024, -57.3804220505))
            Line((1.0885104024, -57.3804220505), (1.0885104024, -54.8404220505))
            Line((1.0885104024, -54.8404220505), (-21.2634895976, -54.8404220505))
            ThreePointArc((-21.2634895976, -54.8404220505), (-27.9088791272, -52.0878115801), (-30.6614895976, -45.4424220505))
            Line((-30.6614895976, -45.4424220505), (-30.6614895976, 65.3015779495))
            ThreePointArc((-30.6614895976, 65.3015779495), (-27.9088791272, 71.9469674791), (-21.2634895976, 74.6995779495))
            Line((-21.2634895976, 74.6995779495), (1.0885104024, 74.6995779495))
            Line((1.0885104024, 74.6995779495), (1.0885104024, 77.2395779495))
        make_face()
    extrude(amount=-F9_DEPTH)

    # F10: cut F1
    add(f1.part, mode=Mode.SUBTRACT)

    # F11
    f11_edges = [f7.edges().sort_by_distance(p)[0] for p in [
        (-30.66149, 9.929578, -2.54),
        (-35.74149, 9.929578, -2.54),
        (33.678002, -55.679914, -2.54),
        (1.08851, -59.920422, -2.54),
        (37.91851, 9.929578, -2.54),
        (33.678002, 75.53907, -2.54),
        (1.08851, 79.779578, -2.54),
        (-31.500982, 75.53907, -2.54),
        (-31.500982, -55.679914, -2.54),
        (30.0859, 71.946967, -2.54),
        (32.83851, 9.929578, -2.54),
        (30.0859, -52.087812, -2.54),
        (1.08851, -54.840422, -2.54),
        (-27.908879, -52.087812, -2.54),
        (-27.908879, 71.946967, -2.54),
        (1.08851, 74.699578, -2.54),
    ]]
    fillet(f11_edges, radius=F11_R)

    # F6 (on face) → F12 (cut, symmetric)
    with BuildSketch(Plane.XZ.offset(57.3804220505)):
        with Locations((0.8325793897, 6.9699145957)):
            Rectangle(F6_W, F6_H)
    extrude(amount=F12_DEPTH, both=True, mode=Mode.SUBTRACT)

    # F13
    f13_edges = [f7.edges().sort_by_distance(p)[0] for p in [
        (37.91851, 9.929578, 16.764),
        (33.678002, -55.679914, 16.764),
        (1.08851, -59.920422, 16.764),
        (33.678002, 75.53907, 16.764),
        (1.08851, 79.779578, 16.764),
        (-31.500982, 75.53907, 16.764),
        (-35.74149, 9.929578, 16.764),
        (-31.500982, -55.679914, 16.764),
    ]]
    fillet(f13_edges, radius=F13_R)


solid = f7.part
